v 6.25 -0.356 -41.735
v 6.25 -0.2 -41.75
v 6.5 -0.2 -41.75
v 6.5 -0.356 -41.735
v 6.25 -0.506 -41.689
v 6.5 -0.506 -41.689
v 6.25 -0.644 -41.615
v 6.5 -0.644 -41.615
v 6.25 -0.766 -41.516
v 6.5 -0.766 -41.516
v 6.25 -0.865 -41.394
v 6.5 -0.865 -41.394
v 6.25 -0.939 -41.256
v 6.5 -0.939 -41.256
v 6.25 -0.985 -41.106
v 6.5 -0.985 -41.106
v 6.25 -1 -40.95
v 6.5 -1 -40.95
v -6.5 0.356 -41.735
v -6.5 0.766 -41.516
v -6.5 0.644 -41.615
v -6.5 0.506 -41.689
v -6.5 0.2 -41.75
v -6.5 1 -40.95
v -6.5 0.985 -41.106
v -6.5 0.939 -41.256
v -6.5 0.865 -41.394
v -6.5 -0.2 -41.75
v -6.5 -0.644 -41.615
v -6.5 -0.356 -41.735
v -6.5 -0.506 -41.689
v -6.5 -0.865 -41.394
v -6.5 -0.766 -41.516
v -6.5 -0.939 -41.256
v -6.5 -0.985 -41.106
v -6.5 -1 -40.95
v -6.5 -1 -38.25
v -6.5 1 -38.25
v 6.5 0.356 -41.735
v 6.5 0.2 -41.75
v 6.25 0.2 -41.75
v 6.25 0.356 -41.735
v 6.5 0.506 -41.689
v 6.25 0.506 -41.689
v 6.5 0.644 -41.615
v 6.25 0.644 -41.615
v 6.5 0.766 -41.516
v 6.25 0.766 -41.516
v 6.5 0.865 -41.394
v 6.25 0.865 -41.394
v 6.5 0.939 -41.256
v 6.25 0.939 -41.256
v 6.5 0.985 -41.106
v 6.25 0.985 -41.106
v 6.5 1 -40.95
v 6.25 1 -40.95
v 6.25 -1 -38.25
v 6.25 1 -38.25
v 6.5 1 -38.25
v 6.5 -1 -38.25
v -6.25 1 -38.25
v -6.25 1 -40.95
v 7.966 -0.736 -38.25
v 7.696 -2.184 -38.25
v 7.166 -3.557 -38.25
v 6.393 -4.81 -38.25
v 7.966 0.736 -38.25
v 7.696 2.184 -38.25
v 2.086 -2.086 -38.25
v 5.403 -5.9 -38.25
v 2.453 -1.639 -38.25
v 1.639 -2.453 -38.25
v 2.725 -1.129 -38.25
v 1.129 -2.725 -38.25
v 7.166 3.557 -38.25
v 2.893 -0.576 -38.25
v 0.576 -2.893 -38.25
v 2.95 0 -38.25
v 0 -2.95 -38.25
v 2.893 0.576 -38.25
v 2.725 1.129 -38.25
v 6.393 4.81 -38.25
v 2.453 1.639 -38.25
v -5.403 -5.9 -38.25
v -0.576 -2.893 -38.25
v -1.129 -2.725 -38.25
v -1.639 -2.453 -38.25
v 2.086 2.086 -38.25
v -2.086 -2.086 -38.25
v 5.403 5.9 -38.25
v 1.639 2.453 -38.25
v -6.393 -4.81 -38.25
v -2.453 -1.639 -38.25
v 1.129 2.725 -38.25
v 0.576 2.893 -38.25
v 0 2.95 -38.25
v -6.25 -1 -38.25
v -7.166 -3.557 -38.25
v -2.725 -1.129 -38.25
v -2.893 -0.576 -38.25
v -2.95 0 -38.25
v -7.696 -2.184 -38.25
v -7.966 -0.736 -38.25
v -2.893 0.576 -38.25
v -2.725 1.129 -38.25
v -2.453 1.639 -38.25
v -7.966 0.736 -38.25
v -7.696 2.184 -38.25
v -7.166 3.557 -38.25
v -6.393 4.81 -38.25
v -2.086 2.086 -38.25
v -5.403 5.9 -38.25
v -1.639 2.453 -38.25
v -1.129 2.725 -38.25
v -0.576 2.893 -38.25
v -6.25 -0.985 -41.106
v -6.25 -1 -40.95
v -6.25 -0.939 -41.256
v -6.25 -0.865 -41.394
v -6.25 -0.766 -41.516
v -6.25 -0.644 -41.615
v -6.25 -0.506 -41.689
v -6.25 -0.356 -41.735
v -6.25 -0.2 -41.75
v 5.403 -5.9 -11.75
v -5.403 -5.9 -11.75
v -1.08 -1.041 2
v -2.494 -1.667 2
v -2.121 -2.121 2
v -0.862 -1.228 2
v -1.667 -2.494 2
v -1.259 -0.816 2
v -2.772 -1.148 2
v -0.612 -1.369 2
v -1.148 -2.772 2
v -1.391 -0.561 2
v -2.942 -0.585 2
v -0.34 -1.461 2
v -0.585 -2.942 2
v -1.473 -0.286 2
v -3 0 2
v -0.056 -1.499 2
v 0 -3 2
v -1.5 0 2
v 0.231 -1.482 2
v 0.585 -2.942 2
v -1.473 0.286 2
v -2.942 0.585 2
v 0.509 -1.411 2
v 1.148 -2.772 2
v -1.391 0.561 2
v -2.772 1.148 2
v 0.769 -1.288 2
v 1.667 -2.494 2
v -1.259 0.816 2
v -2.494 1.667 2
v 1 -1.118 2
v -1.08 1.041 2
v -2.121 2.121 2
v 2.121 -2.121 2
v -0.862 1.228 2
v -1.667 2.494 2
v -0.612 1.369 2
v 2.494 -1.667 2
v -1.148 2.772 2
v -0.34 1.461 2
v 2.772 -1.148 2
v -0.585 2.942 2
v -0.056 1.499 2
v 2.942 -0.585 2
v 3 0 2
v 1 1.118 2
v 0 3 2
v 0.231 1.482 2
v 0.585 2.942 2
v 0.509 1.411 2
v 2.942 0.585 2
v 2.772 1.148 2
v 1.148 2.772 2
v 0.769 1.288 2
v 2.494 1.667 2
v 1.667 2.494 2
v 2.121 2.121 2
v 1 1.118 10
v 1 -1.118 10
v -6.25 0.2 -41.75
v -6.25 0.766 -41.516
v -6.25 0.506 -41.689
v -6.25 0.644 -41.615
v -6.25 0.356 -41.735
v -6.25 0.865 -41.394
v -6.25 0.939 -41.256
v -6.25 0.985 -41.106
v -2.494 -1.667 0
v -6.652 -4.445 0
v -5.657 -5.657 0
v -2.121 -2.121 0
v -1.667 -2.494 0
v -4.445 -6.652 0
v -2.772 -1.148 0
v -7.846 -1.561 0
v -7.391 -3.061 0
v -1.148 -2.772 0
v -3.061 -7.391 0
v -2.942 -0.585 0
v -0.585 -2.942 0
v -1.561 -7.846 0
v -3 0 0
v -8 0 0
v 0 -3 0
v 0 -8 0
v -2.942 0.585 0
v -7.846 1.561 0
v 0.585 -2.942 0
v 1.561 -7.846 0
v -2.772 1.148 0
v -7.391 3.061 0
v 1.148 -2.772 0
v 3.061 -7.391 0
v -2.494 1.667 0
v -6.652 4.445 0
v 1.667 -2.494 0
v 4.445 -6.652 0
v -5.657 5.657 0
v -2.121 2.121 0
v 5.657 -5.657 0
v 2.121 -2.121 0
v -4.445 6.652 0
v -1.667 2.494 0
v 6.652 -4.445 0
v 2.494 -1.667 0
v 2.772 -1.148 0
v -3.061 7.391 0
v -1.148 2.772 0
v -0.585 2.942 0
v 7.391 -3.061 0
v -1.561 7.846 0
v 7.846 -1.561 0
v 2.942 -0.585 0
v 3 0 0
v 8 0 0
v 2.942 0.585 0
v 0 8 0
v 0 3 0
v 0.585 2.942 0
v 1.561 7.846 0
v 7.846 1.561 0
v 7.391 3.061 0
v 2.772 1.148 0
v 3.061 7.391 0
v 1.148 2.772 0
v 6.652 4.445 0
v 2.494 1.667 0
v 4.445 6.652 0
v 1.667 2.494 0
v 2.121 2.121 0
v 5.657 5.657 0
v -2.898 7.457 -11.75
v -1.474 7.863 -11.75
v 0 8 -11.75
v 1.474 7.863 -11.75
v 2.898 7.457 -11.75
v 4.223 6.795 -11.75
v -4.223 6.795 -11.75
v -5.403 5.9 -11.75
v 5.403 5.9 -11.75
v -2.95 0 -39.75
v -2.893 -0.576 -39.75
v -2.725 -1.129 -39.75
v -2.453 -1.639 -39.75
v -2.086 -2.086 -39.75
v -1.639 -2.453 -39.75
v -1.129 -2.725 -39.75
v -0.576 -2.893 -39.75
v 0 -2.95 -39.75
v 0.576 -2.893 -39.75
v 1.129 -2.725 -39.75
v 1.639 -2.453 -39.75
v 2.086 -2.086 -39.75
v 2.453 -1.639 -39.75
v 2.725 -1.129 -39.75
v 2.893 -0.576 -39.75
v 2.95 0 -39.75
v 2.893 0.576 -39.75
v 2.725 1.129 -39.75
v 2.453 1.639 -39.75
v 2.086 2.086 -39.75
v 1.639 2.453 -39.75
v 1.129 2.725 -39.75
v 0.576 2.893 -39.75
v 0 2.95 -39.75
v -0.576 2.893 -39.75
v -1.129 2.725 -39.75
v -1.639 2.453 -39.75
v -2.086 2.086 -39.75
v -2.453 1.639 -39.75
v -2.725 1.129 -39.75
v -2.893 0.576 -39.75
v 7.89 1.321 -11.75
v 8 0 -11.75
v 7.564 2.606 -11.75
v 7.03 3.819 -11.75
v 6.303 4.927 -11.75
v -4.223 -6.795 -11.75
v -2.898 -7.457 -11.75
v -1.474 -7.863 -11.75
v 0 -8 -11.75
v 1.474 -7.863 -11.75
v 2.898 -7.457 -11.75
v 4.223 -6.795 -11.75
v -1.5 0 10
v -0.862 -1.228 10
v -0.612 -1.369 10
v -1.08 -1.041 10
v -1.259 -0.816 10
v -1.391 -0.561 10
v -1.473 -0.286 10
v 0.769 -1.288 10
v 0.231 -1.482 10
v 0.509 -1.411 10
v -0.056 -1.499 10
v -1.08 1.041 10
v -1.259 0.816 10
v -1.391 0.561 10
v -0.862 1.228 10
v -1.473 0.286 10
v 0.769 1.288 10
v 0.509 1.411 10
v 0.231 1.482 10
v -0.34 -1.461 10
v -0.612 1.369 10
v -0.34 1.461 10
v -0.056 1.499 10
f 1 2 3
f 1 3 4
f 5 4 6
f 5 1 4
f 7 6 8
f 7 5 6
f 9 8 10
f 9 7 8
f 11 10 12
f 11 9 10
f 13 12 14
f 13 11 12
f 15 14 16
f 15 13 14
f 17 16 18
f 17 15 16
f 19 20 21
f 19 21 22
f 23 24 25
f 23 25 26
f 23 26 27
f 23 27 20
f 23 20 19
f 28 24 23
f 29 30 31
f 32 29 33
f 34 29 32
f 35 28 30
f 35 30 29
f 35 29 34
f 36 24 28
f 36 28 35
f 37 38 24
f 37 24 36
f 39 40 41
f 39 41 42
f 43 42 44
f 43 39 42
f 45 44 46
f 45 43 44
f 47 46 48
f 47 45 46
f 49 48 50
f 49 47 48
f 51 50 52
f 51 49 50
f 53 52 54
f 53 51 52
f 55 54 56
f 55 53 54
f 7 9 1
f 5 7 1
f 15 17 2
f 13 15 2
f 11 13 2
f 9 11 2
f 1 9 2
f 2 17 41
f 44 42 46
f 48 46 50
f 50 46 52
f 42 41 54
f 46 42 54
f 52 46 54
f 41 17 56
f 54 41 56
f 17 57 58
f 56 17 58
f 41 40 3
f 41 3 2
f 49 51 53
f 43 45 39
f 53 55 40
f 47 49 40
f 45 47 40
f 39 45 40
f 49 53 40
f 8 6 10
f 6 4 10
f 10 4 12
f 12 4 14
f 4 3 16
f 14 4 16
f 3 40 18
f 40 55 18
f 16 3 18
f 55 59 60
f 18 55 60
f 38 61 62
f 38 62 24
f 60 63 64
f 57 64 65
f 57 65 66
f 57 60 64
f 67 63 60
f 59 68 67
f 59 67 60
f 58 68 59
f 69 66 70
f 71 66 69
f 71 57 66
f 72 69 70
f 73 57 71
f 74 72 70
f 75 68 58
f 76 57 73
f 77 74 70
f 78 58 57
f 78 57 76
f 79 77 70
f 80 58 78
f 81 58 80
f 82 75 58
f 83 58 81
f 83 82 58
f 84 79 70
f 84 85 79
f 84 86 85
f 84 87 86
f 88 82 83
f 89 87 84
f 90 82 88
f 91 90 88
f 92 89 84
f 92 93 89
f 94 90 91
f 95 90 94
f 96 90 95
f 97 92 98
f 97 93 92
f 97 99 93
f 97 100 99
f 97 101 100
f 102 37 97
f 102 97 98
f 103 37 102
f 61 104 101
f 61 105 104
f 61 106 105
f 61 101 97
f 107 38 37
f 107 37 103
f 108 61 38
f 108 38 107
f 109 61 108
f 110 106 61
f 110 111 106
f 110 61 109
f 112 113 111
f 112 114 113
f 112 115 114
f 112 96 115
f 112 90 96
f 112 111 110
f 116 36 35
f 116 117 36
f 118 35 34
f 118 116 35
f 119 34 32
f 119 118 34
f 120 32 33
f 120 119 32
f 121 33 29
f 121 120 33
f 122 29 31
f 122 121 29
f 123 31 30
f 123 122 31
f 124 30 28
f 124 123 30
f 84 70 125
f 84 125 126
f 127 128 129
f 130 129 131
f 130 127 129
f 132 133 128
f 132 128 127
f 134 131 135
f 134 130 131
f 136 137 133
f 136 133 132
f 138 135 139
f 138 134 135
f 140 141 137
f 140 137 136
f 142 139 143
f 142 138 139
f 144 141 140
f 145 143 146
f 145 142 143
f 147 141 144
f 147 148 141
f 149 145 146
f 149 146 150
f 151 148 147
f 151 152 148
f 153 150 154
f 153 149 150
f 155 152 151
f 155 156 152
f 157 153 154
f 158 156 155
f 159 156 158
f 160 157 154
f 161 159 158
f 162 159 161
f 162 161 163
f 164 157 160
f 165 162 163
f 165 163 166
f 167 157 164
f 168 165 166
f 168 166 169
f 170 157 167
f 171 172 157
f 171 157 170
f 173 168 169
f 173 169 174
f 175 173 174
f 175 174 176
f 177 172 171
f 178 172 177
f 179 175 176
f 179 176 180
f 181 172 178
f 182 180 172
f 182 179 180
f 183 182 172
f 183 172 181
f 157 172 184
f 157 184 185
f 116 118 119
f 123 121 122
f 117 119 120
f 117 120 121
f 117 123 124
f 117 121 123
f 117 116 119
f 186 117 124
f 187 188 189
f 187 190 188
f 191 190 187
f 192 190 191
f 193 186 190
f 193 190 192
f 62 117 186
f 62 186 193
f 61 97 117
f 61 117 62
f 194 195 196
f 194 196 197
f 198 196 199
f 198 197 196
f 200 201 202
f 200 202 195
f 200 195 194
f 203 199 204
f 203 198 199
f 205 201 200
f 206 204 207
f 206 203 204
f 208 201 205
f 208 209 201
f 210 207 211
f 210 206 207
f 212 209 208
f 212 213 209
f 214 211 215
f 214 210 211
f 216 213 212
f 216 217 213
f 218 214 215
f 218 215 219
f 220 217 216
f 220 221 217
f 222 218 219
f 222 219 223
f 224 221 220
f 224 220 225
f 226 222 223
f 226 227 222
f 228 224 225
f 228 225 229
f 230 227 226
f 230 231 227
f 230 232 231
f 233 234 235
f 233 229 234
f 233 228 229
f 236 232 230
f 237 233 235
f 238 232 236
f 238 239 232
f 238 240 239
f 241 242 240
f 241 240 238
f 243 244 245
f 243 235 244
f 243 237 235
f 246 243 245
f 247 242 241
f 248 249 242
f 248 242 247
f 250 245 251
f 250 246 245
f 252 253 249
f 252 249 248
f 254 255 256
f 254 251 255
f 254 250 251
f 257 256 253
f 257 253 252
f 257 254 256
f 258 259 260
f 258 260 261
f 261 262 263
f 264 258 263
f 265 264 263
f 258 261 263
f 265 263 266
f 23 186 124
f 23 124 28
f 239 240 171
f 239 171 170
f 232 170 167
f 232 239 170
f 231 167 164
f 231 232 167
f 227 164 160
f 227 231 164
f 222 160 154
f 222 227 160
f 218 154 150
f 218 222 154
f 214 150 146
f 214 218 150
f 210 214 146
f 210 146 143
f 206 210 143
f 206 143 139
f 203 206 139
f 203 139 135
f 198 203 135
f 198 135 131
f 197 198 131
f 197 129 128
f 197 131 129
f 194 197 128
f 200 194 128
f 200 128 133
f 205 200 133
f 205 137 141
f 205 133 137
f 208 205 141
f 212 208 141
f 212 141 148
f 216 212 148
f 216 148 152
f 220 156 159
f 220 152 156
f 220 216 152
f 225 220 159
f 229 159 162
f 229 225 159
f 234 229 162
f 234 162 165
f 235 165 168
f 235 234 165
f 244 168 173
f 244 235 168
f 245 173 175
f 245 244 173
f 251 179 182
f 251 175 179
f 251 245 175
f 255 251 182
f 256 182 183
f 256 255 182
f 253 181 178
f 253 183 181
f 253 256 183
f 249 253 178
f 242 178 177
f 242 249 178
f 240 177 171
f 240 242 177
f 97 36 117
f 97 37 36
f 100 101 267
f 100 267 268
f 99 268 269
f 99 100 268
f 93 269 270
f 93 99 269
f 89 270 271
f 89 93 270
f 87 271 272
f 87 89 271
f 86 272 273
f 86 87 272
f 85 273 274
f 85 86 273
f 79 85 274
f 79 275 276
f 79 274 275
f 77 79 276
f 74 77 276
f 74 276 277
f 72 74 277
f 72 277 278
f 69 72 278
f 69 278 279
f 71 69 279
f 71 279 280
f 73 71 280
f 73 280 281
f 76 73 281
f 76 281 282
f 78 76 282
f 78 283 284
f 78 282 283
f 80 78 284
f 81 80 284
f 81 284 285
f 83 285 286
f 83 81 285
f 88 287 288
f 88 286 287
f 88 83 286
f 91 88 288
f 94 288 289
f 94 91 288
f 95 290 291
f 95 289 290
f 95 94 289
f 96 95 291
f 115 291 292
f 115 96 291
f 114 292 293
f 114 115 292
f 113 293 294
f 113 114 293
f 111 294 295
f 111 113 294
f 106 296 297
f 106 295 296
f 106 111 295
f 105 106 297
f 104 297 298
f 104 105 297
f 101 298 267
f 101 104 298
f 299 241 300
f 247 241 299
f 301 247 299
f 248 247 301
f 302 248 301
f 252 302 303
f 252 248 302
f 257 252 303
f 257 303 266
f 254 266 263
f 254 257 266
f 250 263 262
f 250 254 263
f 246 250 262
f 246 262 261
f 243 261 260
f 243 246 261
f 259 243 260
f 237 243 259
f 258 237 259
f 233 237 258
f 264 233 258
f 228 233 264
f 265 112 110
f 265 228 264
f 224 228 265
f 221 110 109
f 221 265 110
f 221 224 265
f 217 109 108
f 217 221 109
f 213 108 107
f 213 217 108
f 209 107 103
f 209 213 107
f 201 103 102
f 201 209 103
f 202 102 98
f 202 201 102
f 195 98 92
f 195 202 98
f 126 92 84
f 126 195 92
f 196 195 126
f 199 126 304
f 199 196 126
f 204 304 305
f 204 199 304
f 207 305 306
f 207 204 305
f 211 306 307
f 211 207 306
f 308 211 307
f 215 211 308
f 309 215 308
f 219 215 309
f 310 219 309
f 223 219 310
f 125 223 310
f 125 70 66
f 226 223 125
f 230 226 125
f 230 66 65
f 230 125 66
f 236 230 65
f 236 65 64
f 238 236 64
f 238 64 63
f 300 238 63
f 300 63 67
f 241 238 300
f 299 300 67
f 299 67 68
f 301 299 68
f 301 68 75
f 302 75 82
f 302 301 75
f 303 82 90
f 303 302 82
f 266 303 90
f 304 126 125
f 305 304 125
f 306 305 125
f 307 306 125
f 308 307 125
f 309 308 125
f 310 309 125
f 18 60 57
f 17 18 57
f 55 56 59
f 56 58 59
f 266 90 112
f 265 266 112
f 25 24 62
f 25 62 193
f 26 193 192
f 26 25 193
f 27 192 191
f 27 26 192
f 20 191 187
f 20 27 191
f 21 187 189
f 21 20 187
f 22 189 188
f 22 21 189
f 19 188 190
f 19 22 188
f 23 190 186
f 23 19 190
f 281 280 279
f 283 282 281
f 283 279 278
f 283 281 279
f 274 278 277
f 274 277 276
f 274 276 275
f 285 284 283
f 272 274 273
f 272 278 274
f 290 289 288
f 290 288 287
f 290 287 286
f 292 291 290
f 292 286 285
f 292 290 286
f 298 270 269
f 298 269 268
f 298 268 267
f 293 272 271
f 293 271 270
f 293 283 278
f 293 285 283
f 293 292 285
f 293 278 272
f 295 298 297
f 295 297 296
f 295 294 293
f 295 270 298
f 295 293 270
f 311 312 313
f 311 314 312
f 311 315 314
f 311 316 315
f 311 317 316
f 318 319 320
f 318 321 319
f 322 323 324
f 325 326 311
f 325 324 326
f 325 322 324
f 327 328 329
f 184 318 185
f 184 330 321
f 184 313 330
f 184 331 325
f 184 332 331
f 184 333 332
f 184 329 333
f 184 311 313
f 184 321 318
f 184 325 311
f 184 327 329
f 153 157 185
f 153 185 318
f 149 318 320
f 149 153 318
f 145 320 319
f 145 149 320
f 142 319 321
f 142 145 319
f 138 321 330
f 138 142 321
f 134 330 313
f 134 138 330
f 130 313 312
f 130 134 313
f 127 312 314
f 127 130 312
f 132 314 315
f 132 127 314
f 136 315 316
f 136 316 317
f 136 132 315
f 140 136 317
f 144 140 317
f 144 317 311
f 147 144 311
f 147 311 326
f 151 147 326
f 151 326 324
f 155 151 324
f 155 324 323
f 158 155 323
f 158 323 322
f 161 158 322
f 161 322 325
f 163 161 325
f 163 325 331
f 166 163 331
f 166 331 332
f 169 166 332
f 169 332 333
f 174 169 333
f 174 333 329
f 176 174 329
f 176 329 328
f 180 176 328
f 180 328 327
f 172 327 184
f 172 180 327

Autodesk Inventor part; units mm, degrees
ref_plane "YZ Plane" through (0, 0, 0) normal (1, 0, 0) x (0, 1, 0)
ref_plane "XZ Plane" through (0, 0, 0) normal (0, 1, 0) x (-1, 0, 0)
ref_plane "XY Plane" through (0, 0, 0) normal (0, 0, 1) x (1, 0, 0)
sketch "Sketch3" plane through (0, 0, 0) normal (0, 0, 1) x (1, 0, 0)
  circle A0 centre (0, 0) radius 8
  dimension "d1" = 16
extrude "Extrusion1" add sketch "Sketch3" against normal blind 11.75
sketch "Sketch4" plane through (0, 0, -11.75) normal (0, 0, -1) x (-1, 0, 0)
  line L0 (-5.4028, 5.9) -> (5.4028, 5.9)
  circle A0 centre (0, 0) radius 8 projected
  line L1 (-5.4028, -5.9) -> (5.4028, -5.9)
  line L2 (0, 5.9) -> (0, -5.9)
  dimension "d6" = 11.8
extrude "Extrusion2" add sketch "Sketch4" along normal blind 26.5 contours L0 L2 L1 A0 | L0 A0 L1 L2
sketch "Sketch5" plane through (0, 0, 0) normal (0, 0, 1) x (1, 0, 0)
  circle A0 centre (0, 0) radius 3
  dimension "d9" = 6
extrude "Extrusion3" add sketch "Sketch5" along normal blind 2
sketch "Sketch6" plane through (0, 0, 2) normal (0, 0, 1) x (1, 0, 0)
  circle A0 centre (0, 0) radius 1.5
  line L0 (0, -11.2) -> (0, 11.2) projected
  line L1 (1, 1.118) -> (1, -1.118)
  dimension "d12" = 3
  dimension "d13" = 1
extrude "Extrusion4" add sketch "Sketch6" along normal blind 8 contours L1 A0 L0 | L0 A0
sketch "Sketch7" plane through (0, 0, -38.25) normal (0, 0, -1) x (-1, 0, 0)
  circle A0 centre (0, 0) radius 2.95
  dimension "d16" = 5.9
extrude "Extrusion5" add sketch "Sketch7" along normal blind 1.5
sketch "Sketch10" plane through (0, 0, -38.25) normal (0, 0, -1) x (-1, 0, 0)
  line L0 (-6.5, -1) -> (-6.25, -1)
  line L1 (-6.25, -1) -> (-6.25, 1)
  line L2 (-6.25, 1) -> (-6.5, 1)
  line L3 (-6.5, 1) -> (-6.5, -1)
  line L4 (-6.5, -1) -> (-6.25, 1) construction
  line L5 (-6.25, -1) -> (-6.5, 1) construction
  line L6 (11.2, 0) -> (-11.2, 0) projected
  line L7 (0, -11.2) -> (0, 11.2) projected
  line L8 (6.5, -1) -> (6.25, -1)
  line L9 (6.25, -1) -> (6.25, 1)
  line L10 (6.25, 1) -> (6.5, 1)
  line L11 (6.5, 1) -> (6.5, -1)
  point P0 (0, 0)
  point P1 (-6.375, 0)
  point P2 (-6.375, 0)
  dimension "d23" = 0.25
  dimension "d24" = 2
  dimension "d25" = 13
extrude "Extrusion7" add sketch "Sketch10" along normal blind 3.5
fillet "Fillet2" radius 0.8 4 edges at (-6.375, 1, -41.75) (-6.375, -1, -41.75) (6.375, 1, -41.75) (6.375, -1, -41.75)
properties part number "DriveMotorV1" material "Motor"
